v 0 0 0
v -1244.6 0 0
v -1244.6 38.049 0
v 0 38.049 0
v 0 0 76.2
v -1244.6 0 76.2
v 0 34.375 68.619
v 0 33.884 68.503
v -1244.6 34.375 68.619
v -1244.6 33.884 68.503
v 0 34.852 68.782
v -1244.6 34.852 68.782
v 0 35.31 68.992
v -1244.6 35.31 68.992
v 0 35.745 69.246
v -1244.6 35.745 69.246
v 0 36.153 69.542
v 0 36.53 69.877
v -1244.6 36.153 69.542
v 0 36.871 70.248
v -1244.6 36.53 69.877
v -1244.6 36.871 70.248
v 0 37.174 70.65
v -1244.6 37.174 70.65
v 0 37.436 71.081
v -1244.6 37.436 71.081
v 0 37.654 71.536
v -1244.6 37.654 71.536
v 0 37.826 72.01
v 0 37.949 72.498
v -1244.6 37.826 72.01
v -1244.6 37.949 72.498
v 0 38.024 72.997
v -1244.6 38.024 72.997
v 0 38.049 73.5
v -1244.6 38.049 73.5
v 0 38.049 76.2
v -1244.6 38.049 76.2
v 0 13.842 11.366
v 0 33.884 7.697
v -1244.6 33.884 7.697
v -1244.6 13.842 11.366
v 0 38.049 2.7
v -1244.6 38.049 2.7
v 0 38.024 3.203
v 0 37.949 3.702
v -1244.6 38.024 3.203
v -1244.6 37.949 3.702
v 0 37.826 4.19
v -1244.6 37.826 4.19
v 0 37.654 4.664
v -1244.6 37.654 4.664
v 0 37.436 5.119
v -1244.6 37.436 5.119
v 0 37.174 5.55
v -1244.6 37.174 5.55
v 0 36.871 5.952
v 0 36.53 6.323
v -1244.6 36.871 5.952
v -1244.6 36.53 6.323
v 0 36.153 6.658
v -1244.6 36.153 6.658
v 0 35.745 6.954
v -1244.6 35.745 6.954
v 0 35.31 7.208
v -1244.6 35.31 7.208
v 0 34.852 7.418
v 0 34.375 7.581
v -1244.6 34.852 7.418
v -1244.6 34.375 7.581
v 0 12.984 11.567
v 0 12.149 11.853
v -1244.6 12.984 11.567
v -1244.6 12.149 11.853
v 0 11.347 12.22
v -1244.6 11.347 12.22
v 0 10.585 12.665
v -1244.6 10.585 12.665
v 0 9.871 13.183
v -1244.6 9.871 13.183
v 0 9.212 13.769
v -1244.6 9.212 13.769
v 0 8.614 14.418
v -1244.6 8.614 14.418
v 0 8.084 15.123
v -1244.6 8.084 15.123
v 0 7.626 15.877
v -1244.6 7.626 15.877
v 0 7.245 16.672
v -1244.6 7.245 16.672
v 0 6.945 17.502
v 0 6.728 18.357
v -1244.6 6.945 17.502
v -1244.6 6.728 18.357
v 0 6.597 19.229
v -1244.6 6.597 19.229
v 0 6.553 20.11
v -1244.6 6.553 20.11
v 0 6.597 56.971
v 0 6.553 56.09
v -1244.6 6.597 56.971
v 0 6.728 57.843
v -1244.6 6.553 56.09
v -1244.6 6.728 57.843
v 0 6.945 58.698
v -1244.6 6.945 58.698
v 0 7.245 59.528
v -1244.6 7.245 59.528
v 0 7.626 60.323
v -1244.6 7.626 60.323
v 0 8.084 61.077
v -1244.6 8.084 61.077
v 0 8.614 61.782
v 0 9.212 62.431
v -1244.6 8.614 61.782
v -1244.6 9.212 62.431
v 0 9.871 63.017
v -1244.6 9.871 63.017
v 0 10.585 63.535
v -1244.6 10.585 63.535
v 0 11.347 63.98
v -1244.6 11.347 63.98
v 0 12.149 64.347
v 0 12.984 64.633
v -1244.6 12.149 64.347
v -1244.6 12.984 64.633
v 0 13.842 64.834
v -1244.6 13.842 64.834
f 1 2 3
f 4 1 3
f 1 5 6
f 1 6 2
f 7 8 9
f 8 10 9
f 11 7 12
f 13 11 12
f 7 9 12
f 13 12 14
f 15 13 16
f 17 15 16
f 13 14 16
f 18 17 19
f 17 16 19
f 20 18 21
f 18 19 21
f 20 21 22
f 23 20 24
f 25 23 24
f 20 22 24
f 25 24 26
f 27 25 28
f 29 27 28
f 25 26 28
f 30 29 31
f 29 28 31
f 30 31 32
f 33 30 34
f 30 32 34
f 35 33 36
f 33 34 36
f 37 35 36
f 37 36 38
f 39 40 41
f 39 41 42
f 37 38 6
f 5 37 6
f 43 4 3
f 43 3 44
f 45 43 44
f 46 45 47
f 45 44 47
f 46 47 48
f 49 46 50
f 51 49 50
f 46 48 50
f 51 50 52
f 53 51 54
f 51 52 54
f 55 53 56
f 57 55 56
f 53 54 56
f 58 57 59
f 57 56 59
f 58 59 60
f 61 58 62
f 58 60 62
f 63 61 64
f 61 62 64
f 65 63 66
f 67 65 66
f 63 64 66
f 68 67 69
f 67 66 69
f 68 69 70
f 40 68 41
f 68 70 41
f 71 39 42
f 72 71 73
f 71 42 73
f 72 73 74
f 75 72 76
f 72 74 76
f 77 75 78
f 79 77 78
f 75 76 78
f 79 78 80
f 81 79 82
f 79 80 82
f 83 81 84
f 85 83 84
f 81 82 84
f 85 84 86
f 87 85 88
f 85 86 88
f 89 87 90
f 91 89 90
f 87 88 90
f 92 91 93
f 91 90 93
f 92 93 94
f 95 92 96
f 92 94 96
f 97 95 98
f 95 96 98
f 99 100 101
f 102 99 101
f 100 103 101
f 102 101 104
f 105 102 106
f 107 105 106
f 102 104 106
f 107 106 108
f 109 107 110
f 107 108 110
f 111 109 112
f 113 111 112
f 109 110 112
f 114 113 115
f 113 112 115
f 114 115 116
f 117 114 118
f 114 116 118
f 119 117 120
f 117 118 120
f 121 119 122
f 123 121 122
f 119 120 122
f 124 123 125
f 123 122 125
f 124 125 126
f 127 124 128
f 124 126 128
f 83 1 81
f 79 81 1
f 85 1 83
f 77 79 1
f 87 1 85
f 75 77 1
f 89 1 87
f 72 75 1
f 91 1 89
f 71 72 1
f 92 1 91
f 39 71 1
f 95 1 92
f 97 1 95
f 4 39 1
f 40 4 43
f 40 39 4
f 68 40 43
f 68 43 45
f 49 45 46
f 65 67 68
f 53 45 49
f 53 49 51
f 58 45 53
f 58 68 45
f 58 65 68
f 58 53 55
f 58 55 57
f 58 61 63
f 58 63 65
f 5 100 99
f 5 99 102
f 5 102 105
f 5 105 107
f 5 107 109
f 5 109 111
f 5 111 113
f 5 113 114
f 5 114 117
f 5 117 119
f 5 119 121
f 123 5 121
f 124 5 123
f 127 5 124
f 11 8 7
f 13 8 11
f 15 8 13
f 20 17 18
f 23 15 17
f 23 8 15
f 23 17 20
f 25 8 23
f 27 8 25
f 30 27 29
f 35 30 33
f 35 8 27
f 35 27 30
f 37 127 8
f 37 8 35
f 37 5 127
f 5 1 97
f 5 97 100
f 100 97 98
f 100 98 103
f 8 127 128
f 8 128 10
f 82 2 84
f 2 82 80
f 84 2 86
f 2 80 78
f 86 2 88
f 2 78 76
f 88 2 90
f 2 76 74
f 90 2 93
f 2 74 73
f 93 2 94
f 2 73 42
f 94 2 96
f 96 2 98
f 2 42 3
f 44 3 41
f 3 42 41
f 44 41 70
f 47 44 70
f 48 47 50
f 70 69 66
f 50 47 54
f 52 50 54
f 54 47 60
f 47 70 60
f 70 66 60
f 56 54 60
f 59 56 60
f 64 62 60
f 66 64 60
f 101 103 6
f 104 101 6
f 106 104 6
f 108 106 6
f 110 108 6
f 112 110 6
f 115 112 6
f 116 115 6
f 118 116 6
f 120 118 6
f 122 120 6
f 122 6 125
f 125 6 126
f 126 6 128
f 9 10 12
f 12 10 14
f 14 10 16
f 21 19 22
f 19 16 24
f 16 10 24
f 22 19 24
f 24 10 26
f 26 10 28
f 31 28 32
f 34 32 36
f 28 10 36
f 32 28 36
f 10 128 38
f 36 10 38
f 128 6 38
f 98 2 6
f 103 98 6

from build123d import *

# Parameters (mm, degrees)
F1_DEPTH = 1244.6
F2_R     = 5.08
F3_R     = 8.89


with BuildPart() as f1:
    # F0 (on Right) → F1 (new body)
    with BuildSketch(Plane.YZ):
        Polygon((0, 76.2), (0, 0), (38.0492, 0), (38.0492, 6.9342), (6.5532, 12.7), (6.5532, 63.5), (38.0492, 69.2658), (38.0492, 76.2), align=None)
    extrude(amount=-F1_DEPTH)

    # F2
    f2_edges = [f1.edges().sort_by_distance(p)[0] for p in [
        (-622.3, 38.0492, 69.2658),
        (-622.3, 38.0492, 6.9342),
    ]]
    fillet(f2_edges, radius=F2_R)

    # F3
    f3_edges = [f1.edges().sort_by_distance(p)[0] for p in [
        (-622.3, 6.5532, 12.7),
        (-622.3, 6.5532, 63.5),
    ]]
    fillet(f3_edges, radius=F3_R)


solid = f1.part
